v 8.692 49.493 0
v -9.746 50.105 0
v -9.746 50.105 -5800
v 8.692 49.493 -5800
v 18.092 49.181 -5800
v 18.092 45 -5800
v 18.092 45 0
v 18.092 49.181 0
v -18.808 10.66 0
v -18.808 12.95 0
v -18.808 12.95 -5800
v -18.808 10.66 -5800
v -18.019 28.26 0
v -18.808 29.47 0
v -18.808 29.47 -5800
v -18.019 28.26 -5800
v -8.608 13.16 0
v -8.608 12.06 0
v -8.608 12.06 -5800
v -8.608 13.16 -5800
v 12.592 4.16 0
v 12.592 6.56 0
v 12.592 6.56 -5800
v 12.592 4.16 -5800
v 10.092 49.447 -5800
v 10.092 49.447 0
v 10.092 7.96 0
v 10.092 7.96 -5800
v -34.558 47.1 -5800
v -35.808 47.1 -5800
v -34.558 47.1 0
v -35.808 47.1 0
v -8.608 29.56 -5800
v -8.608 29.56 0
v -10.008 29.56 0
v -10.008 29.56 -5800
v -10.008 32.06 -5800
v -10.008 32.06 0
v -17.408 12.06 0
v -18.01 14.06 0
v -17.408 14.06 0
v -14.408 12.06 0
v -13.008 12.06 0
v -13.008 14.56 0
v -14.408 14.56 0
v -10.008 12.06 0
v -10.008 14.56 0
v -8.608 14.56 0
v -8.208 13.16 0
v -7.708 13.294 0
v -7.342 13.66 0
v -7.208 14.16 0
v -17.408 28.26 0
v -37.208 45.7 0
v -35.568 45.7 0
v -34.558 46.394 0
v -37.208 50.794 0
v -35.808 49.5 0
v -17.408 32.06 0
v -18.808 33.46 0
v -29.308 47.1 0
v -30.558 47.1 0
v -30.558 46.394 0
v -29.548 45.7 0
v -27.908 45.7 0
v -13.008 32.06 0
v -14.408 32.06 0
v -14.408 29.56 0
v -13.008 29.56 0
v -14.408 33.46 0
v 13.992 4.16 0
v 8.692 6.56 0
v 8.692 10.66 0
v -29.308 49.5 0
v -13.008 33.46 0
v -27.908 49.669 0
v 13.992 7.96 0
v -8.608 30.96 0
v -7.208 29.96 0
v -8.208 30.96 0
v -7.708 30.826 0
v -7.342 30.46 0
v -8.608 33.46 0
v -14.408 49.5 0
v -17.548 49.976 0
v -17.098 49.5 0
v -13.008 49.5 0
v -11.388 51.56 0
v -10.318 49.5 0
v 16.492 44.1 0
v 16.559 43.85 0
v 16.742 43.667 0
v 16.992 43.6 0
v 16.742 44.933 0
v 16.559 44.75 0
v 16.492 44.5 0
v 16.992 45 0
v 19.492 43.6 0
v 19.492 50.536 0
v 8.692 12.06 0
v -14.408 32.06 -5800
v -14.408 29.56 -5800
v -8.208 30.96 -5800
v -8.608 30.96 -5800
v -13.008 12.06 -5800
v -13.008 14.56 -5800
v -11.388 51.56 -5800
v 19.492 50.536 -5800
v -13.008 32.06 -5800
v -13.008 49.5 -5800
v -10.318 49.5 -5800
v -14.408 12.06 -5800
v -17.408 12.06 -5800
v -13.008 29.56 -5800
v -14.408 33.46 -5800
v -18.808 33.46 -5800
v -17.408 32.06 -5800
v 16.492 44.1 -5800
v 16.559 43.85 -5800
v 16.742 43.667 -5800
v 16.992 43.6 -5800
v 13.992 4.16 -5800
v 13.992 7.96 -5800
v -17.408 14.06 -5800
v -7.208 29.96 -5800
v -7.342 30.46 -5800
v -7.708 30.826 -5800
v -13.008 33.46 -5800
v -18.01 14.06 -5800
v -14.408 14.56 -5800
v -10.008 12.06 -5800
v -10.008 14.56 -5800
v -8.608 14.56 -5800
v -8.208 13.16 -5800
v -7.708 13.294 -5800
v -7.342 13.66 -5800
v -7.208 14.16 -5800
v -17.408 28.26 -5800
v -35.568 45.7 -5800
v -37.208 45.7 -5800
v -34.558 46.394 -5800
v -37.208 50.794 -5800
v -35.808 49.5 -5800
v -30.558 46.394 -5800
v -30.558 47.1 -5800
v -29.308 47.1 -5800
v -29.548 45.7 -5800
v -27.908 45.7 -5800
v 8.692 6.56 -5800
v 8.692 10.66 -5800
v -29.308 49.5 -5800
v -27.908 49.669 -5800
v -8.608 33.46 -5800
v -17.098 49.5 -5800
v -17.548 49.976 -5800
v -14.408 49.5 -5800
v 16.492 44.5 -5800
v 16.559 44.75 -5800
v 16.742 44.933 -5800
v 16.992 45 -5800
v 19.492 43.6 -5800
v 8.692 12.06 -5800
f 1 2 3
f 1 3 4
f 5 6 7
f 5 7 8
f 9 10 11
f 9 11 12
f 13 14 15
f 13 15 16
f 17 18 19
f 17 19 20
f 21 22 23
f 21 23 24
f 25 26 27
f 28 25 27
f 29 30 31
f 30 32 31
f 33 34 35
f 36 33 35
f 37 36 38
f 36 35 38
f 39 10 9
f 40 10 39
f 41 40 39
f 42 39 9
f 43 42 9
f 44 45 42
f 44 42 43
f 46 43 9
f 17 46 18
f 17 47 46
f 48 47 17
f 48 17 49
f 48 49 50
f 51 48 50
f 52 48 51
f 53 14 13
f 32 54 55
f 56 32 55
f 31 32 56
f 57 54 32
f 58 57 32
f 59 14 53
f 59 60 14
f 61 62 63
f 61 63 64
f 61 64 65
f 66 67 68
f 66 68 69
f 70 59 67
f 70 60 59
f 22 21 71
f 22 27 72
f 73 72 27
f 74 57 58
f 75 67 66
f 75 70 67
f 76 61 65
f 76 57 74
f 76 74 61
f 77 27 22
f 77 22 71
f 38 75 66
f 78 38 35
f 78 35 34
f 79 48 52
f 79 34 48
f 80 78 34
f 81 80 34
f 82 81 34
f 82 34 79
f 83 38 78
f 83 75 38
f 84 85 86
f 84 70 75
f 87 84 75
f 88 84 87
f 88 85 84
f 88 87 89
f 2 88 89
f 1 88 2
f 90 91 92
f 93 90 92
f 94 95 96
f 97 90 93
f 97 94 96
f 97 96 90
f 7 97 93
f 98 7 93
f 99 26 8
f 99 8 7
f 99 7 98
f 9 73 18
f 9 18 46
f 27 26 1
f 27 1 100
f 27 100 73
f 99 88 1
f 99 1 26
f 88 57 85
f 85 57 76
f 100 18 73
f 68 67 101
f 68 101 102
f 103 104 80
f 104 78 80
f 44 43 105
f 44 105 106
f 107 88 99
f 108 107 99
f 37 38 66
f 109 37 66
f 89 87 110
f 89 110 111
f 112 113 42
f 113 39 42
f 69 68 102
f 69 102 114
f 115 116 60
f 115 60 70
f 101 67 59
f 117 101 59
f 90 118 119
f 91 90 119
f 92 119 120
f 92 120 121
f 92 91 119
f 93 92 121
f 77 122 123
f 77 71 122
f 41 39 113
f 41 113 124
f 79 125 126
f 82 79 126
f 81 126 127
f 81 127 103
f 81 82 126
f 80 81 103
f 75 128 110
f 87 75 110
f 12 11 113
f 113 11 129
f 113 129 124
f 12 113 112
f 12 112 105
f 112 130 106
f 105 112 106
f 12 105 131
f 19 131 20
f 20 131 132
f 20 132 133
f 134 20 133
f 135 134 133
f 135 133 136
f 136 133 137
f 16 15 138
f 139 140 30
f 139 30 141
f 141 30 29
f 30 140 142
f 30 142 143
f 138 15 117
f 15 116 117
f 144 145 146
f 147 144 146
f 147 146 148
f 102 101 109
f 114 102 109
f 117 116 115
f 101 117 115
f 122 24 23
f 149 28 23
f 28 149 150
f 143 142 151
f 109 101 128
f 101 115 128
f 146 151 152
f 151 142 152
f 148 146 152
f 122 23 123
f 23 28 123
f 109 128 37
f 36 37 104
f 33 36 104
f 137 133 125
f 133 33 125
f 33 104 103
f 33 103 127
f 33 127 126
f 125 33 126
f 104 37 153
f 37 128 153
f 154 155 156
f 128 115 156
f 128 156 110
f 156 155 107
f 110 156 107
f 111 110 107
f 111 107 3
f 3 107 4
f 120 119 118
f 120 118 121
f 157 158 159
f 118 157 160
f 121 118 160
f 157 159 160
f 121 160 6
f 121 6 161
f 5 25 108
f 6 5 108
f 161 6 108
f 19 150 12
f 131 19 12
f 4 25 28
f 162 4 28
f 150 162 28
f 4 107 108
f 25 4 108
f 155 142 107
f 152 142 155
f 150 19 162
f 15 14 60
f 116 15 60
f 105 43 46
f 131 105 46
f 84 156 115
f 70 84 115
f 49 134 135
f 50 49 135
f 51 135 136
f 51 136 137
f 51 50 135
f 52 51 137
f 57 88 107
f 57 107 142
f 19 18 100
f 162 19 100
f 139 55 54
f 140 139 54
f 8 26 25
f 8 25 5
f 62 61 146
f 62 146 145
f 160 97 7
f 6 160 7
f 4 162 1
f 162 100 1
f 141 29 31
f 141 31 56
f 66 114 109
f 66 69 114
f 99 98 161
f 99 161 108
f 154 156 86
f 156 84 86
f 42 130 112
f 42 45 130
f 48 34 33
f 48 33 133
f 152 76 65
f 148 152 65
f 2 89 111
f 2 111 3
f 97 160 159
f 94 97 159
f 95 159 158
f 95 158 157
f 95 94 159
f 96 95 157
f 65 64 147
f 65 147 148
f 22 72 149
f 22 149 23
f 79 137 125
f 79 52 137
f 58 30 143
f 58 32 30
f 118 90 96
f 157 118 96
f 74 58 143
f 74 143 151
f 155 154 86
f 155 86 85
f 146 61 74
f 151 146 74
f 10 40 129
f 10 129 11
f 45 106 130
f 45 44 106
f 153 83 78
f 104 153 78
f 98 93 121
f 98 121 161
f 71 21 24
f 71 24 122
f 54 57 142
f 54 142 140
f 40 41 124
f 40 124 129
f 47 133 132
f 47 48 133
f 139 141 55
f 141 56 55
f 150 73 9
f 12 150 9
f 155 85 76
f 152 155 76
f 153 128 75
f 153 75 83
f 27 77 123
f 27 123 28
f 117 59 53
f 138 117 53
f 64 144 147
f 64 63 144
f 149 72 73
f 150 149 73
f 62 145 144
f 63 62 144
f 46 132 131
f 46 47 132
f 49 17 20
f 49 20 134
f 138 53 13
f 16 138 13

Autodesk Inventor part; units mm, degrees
ref_plane "YZ Plane" through (0, 0, 0) normal (1, 0, 0) x (0, 1, 0)
ref_plane "XZ Plane" through (0, 0, 0) normal (0, 1, 0) x (-1, 0, 0)
ref_plane "XY Plane" through (0, 0, 0) normal (0, 0, 1) x (1, 0, 0)
sketch "Boceto1" plane through (0, 0, 0) normal (0, 0, 1) x (1, 0, 0)
  line L0 (8.6921, 12.0599) -> (8.6921, 49.4931)
  line L1 (8.6921, 10.6599) -> (-18.8079, 10.6599)
  line L2 (8.6921, 6.5599) -> (8.6921, 10.6599)
  line L3 (8.6921, 6.5599) -> (12.5921, 6.5599)
  line L4 (13.9921, 7.9599) -> (10.0921, 7.9599)
  line L5 (12.5921, 6.5599) -> (12.5921, 4.1599)
  line L6 (12.5921, 4.1599) -> (13.9921, 4.1599)
  line L7 (13.9921, 4.1599) -> (13.9921, 7.9599)
  line L8 (-13.0079, 12.0599) -> (-13.0079, 14.5599)
  line L9 (-13.0079, 14.5599) -> (-14.4079, 14.5599)
  line L10 (-14.4079, 14.5599) -> (-14.4079, 12.0599)
  line L11 (-8.6079, 12.0599) -> (-8.6079, 13.1599)
  line L12 (-8.6079, 14.5599) -> (-10.0079, 14.5599)
  line L13 (-10.0079, 14.5599) -> (-10.0079, 12.0599)
  line L14 (-7.2079, 14.1599) -> (-7.2079, 29.9599)
  line L15 (-8.6079, 29.5599) -> (-8.6079, 14.5599)
  line L16 (-17.4079, 12.0599) -> (-14.4079, 12.0599)
  line L17 (-17.4079, 12.0599) -> (-17.4079, 14.0599)
  line L18 (-18.8079, 12.9499) -> (-18.8079, 10.6599)
  line L19 (-17.4079, 14.0599) -> (-18.0102, 14.0599)
  line L20 (-18.0102, 14.0599) -> (-18.8079, 12.9499)
  line L21 (-8.6079, 29.5599) -> (-10.0079, 29.5599)
  line L22 (-10.0079, 29.5599) -> (-10.0079, 32.0599)
  line L23 (-8.6079, 33.4599) -> (-8.6079, 30.9599)
  line L24 (-18.8079, 29.4699) -> (-18.8079, 33.4599)
  line L25 (-14.4079, 32.0599) -> (-14.4079, 29.5599)
  line L26 (-14.4079, 29.5599) -> (-13.0079, 29.5599)
  line L27 (-13.0079, 29.5599) -> (-13.0079, 32.0599)
  line L28 (-10.0079, 32.0599) -> (-13.0079, 32.0599)
  line L29 (-14.4079, 32.0599) -> (-17.4079, 32.0599)
  line L30 (-17.4079, 32.0599) -> (-17.4079, 28.2599)
  line L31 (-17.4079, 28.2599) -> (-18.0191, 28.2599)
  line L32 (-13.0079, 33.4599) -> (-13.0079, 49.4999)
  line L33 (-14.4079, 49.4999) -> (-14.4079, 33.4599)
  line L34 (-18.8079, 33.4599) -> (-14.4079, 33.4599)
  line L35 (-13.0079, 33.4599) -> (-8.6079, 33.4599)
  line L36 (-13.0079, 49.4999) -> (-10.3179, 49.4999)
  line L37 (-10.3179, 49.4999) -> (-9.746, 50.1047)
  line L38 (-14.4079, 49.4999) -> (-17.0979, 49.4999)
  line L39 (-17.0979, 49.4999) -> (-17.5485, 49.9765)
  line L40 (-9.746, 50.1047) -> (8.6921, 49.4931)
  line L41 (-17.5485, 49.9765) -> (-27.9079, 49.669)
  line L42 (-27.9079, 49.669) -> (-27.9079, 45.6999)
  line L43 (-29.3079, 47.0999) -> (-29.3079, 49.4999)
  line L44 (-37.2079, 50.7936) -> (-37.2079, 45.6999)
  line L45 (-35.8079, 47.0999) -> (-35.8079, 49.4999)
  line L46 (-11.3879, 51.5599) -> (19.4921, 50.5356)
  line L47 (-11.3879, 51.5599) -> (-37.2079, 50.7936)
  line L48 (-8.6079, 30.9599) -> (-8.2079, 30.9599)
  line L49 (-8.6079, 13.1599) -> (-8.2079, 13.1599)
  line L50 (16.9921, 43.5999) -> (19.4921, 43.5999)
  line L51 (19.4921, 43.5999) -> (19.4921, 50.5356)
  line L52 (10.0921, 49.4466) -> (10.0921, 7.9599)
  line L53 (10.0921, 49.4466) -> (18.0921, 49.1812)
  line L54 (18.0921, 44.9999) -> (18.0921, 49.1812)
  line L55 (16.4921, 44.0999) -> (16.4921, 44.4999)
  line L56 (16.9921, 44.9999) -> (18.0921, 44.9999)
  line L57 (-13.0079, 12.0599) -> (-10.0079, 12.0599)
  line L58 (-8.6079, 12.0599) -> (8.6921, 12.0599)
  line L59 (-18.8079, 29.4699) -> (-18.0191, 28.2599)
  line L60 (-35.8079, 49.4999) -> (-29.3079, 49.4999)
  line L61 (-35.8079, 47.0999) -> (-34.5579, 47.0999)
  line L62 (-34.5579, 47.0999) -> (-34.5579, 46.3941)
  line L63 (-34.5579, 46.3941) -> (-35.5679, 45.6999)
  line L64 (-35.5679, 45.6999) -> (-37.2079, 45.6999)
  line L65 (-29.3079, 47.0999) -> (-30.5579, 47.0999)
  line L66 (-30.5579, 47.0999) -> (-30.5579, 46.3941)
  line L67 (-30.5579, 46.3941) -> (-29.5479, 45.6999)
  line L68 (-29.5479, 45.6999) -> (-27.9079, 45.6999)
  arc A0 (-7.2079, 29.9599) -> (-8.2079, 30.9599) centre (-8.2079, 29.9599) ccw
  arc A1 (-8.2079, 13.1599) -> (-7.2079, 14.1599) centre (-8.2079, 14.1599) ccw
  arc A2 (16.9921, 44.9999) -> (16.4921, 44.4999) centre (16.9921, 44.4999) ccw
  arc A3 (16.4921, 44.0999) -> (16.9921, 43.5999) centre (16.9921, 44.0999) ccw
  point P0 (0, 0)
  point P1 (-7.2079, 30.9599)
  point P2 (-7.2079, 13.1599)
  point P3 (16.4921, 43.5999)
  point P4 (16.4921, 44.9999)
  point P5 (-32.5579, 49.4999)
  dimension "d0" = 3.02
  dimension "d1" = 24.5
  dimension "d2" = 1.4
  dimension "d3" = 1.4
  dimension "d4" = 1.4
  dimension "d5" = 1.4
  dimension "d7" = 1.4
  dimension "d8" = 1.4
  dimension "d9" = 1.4
  dimension "d10" = 1.4
  dimension "d11" = 1.4
  dimension "d12" = 1.4
  dimension "d13" = 1.4
  dimension "d14" = 1.4
  dimension "d15" = 1.4
  dimension "d16" = 1.4
  dimension "d17" = 1.4
  dimension "d23" = 1.4
  dimension "d26" = 3
  dimension "d27" = 39.44
  dimension "d31" = 7.9
  dimension "d32" = 2.4
  dimension "d34" = 2.5
  dimension "d35" = 2.5
  dimension "d36" = 3
  dimension "d37" = 3
  dimension "d38" = 3
  dimension "d39" = 3
  dimension "d42" = 4.09
  dimension "d43" = 2.69
  dimension "d44" = 15
  dimension "d45" = 20
  dimension "d47" = 2
  dimension "d48" = 1.11
  dimension "d51" = 1.21
  dimension "d52" = 35.7
  dimension "d53" = 33.1
  dimension "d55" = 32.8
  dimension "d56" = 14.2
  dimension "d58" = 15.9
  dimension "d65" = 1.4
  dimension "d68" = 46.6
  dimension "d69" = 46.6
  dimension "d70" = 2.06
  dimension "d73" = 91.7
  dimension "d74" = 91.9
  dimension "d77" = 1.4
  dimension "d84" = 1.4
  dimension "d87" = 6.5
  dimension "d88" = 9.3
  dimension "d89" = 1.4
  dimension "d90" = 1.4
  dimension "d91" = 3.25
  dimension "d92" = 1.4
  dimension "d93" = 2
  dimension "d96" = 3.01
  dimension "d97" = 6.02
  dimension "d99" = 34.5
  dimension "d100" = 111
  dimension "d102" = 2.4
  dimension "d104" = 1.4
  dimension "d105" = 22.8
  dimension "d106" = 4
  dimension "d107" = 0.7058
extrude "Extrusión1" add sketch "Boceto1" against normal blind 5800
properties part number "SP40-07 INVERSOR CENTRAL" material "Aluminio"
